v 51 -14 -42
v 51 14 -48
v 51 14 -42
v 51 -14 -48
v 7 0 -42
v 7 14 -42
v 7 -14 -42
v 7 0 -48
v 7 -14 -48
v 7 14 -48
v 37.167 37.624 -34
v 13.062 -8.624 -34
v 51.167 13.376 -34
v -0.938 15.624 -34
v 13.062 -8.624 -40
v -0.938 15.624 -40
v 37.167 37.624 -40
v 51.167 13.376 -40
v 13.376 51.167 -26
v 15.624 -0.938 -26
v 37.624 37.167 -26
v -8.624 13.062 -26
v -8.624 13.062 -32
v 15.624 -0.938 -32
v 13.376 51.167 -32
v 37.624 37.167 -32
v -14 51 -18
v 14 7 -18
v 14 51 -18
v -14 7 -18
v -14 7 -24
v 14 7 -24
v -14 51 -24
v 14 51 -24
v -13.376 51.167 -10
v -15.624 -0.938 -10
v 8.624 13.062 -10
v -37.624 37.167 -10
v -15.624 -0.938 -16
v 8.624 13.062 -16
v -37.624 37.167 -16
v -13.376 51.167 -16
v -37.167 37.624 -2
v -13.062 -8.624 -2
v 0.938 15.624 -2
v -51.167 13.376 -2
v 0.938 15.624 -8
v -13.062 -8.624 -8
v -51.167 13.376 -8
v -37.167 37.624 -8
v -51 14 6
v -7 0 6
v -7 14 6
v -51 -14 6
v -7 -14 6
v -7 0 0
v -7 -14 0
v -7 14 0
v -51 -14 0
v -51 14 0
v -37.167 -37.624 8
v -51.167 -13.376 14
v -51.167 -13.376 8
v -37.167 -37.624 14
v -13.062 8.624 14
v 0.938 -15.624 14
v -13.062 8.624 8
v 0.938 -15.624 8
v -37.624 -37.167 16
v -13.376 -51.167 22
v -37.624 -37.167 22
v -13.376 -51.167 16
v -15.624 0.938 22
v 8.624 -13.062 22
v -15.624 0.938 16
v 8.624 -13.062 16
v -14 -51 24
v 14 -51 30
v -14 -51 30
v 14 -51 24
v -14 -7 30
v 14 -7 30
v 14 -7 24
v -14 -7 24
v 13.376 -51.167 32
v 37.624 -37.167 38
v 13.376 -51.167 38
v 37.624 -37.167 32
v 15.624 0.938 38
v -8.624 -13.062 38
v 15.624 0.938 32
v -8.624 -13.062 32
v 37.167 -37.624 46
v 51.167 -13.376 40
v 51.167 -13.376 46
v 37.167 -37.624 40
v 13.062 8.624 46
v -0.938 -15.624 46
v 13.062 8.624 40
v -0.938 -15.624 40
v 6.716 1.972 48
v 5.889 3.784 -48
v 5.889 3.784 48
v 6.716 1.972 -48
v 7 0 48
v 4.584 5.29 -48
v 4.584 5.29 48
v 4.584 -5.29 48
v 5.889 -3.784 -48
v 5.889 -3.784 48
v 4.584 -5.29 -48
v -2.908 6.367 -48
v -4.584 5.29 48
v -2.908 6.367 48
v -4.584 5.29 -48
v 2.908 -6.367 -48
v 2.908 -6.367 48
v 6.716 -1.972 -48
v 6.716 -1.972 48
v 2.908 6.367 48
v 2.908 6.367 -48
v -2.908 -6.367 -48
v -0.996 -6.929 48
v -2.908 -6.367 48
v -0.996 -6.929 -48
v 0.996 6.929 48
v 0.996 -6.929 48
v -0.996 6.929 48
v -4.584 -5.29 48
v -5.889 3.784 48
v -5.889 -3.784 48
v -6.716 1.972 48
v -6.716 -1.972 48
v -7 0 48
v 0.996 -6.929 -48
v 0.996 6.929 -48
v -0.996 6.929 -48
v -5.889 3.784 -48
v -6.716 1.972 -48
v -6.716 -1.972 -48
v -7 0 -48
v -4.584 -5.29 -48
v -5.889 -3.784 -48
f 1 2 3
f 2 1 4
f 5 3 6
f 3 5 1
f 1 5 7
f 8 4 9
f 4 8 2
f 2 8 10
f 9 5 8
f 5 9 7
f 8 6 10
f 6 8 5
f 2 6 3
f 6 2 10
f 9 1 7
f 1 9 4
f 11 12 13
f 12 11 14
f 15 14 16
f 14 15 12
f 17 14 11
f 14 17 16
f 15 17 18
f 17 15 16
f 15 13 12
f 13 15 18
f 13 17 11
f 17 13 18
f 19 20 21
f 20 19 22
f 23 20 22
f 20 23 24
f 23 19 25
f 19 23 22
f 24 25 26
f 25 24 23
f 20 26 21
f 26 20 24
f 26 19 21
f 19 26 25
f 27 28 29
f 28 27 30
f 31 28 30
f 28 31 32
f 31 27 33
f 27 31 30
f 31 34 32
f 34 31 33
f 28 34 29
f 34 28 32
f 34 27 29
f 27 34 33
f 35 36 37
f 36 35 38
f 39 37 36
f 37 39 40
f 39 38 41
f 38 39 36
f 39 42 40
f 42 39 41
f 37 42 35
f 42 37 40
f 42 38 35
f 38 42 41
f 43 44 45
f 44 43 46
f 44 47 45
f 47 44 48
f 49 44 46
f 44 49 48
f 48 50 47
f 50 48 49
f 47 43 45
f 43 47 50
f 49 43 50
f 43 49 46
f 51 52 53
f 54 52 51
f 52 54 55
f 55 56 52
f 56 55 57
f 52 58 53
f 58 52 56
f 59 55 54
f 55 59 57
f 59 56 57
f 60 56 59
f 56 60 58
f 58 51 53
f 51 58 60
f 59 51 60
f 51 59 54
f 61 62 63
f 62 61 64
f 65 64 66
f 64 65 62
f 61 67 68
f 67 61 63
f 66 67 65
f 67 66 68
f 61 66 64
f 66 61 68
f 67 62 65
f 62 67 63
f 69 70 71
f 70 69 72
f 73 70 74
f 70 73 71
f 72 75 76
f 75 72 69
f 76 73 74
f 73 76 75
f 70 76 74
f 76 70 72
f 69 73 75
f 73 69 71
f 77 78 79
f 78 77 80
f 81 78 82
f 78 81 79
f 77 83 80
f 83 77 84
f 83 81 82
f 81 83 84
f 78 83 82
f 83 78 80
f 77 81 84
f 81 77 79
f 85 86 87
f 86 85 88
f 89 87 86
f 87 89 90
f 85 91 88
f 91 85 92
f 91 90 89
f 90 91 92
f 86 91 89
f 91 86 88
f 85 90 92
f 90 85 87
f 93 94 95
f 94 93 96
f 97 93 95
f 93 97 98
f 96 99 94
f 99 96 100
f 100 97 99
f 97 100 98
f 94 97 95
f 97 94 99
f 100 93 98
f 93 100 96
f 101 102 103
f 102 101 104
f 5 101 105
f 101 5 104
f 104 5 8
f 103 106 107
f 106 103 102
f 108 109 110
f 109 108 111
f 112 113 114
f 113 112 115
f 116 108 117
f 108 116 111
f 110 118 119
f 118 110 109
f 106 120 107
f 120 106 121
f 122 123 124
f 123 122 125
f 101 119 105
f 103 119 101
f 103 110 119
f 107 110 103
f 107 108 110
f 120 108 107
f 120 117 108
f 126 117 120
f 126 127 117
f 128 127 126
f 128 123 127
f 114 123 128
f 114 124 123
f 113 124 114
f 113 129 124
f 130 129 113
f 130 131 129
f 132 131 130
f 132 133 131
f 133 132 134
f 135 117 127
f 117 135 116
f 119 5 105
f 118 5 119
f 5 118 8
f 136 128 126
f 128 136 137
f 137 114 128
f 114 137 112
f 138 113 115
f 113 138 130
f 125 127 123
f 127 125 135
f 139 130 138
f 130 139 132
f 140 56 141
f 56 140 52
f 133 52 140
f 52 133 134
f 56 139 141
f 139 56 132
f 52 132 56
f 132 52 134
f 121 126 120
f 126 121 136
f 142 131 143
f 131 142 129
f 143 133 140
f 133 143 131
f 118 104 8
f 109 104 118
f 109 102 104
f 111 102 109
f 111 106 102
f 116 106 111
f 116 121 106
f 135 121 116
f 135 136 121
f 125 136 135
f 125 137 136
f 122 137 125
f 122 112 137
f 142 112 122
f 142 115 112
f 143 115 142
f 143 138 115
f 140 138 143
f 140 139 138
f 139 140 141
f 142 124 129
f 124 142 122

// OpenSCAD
// 3DScad sample: spiral staircase
// Uses only the currently round-trippable subset.

module scene_model() {
    steps = 12;
    step_rise = 8;
    step_run = 44;
    step_w = 28;
    step_h = 6;
    post_r = 7;

    union() {
        cylinder(h=steps * step_rise, r=post_r, center=true);
        for (i = [0 : 1 : steps - 1]) {
            translate([0, 0, -steps * step_rise / 2 + i * step_rise + step_h / 2]) {
                rotate([0, 0, i * 360 / steps]) {
                    translate([post_r + step_run / 2, 0, 0]) {
                        cube([step_run, step_w, step_h], center=true);
                    }
                }
            }
        }
    }
}

scene_model();
